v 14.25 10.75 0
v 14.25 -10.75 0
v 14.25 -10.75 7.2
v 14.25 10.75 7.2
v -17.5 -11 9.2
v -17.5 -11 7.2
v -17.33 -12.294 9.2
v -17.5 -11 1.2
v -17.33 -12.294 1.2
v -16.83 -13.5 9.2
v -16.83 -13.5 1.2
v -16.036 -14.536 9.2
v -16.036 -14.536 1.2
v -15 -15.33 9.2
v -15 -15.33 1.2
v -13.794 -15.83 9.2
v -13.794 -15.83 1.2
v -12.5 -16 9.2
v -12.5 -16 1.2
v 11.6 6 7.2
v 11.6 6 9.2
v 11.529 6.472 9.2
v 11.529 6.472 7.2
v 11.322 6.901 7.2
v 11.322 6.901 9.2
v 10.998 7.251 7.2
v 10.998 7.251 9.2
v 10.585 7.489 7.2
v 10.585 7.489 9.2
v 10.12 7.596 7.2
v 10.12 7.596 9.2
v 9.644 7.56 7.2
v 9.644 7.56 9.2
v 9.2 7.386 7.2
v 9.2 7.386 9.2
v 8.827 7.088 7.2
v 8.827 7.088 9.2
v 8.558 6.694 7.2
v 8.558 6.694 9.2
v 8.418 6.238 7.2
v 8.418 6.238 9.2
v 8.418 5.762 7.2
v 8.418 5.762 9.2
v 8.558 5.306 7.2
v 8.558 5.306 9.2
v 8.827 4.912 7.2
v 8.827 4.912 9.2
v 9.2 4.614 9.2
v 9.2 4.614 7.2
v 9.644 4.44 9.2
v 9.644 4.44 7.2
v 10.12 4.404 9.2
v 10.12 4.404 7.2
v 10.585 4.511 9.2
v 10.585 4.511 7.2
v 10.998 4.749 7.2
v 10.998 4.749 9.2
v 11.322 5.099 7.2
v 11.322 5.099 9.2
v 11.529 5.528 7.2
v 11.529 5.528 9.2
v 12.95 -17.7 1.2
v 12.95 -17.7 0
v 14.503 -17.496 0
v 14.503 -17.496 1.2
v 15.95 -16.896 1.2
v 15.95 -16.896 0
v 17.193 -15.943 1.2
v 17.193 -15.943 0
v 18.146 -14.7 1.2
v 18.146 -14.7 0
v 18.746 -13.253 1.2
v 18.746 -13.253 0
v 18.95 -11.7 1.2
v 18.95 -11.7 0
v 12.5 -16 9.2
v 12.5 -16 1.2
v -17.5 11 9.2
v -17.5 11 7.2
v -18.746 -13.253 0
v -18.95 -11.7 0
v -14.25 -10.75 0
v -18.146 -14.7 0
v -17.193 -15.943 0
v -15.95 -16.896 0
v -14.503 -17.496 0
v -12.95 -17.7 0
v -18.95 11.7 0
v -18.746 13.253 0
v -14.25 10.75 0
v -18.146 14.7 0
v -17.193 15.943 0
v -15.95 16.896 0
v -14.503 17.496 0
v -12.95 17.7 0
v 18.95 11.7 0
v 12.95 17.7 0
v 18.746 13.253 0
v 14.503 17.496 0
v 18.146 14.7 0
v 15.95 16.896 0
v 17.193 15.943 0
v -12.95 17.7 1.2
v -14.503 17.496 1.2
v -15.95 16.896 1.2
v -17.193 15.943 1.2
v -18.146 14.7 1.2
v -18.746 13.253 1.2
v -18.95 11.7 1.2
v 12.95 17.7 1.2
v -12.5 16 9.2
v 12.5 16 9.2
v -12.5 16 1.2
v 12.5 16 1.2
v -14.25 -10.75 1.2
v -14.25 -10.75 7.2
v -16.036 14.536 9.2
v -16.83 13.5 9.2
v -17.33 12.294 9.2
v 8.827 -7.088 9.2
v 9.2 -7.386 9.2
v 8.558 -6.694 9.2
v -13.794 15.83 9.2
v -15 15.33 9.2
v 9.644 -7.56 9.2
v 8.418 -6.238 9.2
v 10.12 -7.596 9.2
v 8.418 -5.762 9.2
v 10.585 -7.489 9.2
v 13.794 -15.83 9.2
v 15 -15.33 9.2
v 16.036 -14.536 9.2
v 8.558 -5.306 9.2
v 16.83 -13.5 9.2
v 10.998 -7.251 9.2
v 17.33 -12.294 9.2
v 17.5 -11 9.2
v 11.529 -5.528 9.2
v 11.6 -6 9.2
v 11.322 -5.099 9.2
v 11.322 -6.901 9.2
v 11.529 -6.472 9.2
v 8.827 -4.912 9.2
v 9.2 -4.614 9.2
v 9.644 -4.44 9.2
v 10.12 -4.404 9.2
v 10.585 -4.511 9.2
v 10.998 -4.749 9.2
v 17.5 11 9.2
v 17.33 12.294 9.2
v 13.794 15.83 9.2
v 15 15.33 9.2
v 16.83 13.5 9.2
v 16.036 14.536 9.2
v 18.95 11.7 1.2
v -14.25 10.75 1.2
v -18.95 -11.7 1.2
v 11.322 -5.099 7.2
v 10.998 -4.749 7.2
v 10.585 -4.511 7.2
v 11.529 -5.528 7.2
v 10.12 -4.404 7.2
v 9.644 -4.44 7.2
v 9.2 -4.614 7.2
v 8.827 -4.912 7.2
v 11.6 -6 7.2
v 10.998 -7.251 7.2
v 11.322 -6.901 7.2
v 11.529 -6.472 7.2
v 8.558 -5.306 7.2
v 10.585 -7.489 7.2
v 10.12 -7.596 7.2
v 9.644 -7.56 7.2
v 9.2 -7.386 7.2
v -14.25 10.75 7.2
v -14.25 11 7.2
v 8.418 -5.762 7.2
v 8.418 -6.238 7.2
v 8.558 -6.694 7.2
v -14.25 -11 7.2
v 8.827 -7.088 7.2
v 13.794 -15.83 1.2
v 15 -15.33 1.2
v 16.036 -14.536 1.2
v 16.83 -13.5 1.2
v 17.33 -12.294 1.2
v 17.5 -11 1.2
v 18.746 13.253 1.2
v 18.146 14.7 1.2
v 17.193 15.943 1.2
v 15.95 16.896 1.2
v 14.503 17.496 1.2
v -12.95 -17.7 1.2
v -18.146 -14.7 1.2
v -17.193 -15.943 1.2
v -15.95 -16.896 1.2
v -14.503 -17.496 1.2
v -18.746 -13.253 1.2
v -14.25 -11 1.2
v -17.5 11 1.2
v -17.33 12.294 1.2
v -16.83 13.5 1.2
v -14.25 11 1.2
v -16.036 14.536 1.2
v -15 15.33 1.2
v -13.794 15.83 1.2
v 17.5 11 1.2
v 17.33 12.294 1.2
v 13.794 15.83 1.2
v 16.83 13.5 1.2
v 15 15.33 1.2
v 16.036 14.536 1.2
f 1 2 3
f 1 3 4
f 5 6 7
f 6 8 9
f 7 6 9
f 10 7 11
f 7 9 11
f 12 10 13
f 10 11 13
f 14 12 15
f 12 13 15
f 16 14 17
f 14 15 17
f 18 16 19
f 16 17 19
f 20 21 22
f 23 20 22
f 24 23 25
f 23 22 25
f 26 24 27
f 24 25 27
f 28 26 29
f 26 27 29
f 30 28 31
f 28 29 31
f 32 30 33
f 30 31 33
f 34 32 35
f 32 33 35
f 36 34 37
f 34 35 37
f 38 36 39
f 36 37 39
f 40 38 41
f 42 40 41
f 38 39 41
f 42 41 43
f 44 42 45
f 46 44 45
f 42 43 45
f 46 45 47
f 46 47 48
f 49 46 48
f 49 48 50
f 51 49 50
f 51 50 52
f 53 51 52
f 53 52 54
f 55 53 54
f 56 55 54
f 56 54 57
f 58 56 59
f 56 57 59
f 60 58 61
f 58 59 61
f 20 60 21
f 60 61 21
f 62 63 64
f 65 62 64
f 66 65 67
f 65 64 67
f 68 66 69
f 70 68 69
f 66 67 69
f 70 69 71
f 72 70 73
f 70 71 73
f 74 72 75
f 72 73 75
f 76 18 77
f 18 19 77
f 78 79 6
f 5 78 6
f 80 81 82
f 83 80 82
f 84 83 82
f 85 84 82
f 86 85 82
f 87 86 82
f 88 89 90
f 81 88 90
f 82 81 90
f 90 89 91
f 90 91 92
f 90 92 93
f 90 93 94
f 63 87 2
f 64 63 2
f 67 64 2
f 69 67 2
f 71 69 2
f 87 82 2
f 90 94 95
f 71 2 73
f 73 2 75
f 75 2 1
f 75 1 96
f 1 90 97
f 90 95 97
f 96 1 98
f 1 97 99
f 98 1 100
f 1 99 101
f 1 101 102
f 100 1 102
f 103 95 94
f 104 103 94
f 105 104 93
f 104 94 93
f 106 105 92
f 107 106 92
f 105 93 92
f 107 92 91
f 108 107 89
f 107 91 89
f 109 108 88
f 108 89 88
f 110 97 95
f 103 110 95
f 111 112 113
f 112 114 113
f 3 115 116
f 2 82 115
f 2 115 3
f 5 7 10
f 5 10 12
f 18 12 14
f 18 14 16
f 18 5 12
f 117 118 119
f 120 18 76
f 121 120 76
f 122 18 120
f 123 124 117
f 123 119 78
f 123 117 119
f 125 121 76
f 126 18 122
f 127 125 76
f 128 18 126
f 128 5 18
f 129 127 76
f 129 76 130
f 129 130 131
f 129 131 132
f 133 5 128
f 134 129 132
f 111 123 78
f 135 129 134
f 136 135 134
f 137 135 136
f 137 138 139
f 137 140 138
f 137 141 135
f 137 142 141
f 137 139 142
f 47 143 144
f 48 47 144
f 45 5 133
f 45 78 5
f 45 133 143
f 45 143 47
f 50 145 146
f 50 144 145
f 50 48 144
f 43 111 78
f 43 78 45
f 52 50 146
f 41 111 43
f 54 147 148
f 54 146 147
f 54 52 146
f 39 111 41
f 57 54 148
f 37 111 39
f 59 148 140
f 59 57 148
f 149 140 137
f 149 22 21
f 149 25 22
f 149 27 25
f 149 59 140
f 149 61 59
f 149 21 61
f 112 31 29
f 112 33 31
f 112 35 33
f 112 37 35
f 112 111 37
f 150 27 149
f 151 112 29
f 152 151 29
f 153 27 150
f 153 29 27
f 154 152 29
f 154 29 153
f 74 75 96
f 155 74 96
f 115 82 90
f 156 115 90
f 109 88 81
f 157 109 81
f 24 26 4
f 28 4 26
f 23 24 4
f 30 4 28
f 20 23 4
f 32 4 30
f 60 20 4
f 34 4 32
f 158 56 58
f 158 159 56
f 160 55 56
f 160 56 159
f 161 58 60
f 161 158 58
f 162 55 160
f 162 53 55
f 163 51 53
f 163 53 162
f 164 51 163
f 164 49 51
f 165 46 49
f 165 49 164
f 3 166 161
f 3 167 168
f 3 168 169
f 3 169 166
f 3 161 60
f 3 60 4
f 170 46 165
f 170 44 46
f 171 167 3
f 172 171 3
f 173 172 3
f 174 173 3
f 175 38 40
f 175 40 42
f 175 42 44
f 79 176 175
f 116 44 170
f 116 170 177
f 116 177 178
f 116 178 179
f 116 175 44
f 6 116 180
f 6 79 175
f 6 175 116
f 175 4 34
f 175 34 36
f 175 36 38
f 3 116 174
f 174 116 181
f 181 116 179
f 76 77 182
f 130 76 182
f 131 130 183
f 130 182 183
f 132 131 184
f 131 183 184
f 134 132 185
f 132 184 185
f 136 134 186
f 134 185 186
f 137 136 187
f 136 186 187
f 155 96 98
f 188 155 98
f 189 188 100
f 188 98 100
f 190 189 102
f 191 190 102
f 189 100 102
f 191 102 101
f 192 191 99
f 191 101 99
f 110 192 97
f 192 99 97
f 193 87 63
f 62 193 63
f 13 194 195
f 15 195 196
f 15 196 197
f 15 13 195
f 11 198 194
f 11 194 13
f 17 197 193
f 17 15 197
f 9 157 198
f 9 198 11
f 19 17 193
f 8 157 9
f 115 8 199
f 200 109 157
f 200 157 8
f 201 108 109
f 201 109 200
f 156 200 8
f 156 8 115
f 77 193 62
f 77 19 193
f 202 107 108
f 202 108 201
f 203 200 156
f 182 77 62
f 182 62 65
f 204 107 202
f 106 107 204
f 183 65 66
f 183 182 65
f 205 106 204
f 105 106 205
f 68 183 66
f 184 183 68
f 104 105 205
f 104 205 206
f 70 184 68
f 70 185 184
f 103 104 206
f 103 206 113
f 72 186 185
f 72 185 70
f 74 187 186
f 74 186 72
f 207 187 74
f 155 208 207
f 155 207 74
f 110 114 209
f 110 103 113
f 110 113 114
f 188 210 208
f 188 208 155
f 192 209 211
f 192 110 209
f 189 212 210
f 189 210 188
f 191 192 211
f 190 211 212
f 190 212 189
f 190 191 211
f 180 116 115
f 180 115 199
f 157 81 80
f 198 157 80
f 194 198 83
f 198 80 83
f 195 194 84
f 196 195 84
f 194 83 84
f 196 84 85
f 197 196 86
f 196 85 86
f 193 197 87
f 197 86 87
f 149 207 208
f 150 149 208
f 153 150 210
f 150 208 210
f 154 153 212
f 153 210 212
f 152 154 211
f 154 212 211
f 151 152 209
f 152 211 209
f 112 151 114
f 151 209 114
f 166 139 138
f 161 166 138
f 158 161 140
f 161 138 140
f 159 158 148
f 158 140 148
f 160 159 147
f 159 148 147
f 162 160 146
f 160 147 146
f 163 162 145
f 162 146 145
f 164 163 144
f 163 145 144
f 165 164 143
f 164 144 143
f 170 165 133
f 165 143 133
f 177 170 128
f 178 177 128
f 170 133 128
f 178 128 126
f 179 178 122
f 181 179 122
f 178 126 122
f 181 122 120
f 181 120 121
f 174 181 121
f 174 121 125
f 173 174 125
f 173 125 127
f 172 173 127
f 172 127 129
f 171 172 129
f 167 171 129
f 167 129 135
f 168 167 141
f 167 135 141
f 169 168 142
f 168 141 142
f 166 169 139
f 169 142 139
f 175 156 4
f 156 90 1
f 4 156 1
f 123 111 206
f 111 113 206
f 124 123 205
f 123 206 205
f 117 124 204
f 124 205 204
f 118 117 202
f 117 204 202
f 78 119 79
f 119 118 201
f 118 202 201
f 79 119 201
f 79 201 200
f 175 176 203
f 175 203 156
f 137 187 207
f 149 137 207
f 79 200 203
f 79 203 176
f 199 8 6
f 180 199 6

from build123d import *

# Parameters (mm, degrees)
F0_W     = 28.5
F0_H     = 21.5
F1_DEPTH = 1.2
F2_W     = 28.5
F2_H     = 21.5
F3_DEPTH = 6
F5_DEPTH = 2
F6_W     = 22
F6_H     = 6
F7_DEPTH = 3.25
F8_R     = 1.6
F9_DEPTH = 2


with BuildPart() as f1:
    # F0 (on Top) → F1 (new body)
    with BuildSketch(Plane.XY):
        with BuildLine():
            ThreePointArc((18.95, 11.7), (17.192641, 15.942641), (12.95, 17.7))
            Line((12.95, 17.7), (-12.95, 17.7))
            ThreePointArc((-12.95, 17.7), (-17.192641, 15.942641), (-18.95, 11.7))
            Line((-18.95, 11.7), (-18.95, -11.7))
            ThreePointArc((-18.95, -11.7), (-17.192641, -15.942641), (-12.95, -17.7))
            Line((-12.95, -17.7), (12.95, -17.7))
            ThreePointArc((12.95, -17.7), (17.192641, -15.942641), (18.95, -11.7))
            Line((18.95, -11.7), (18.95, 11.7))
        make_face()
        Rectangle(F0_W, F0_H, mode=Mode.SUBTRACT)
    extrude(amount=F1_DEPTH)

    # F2 (on face) → F3 (join)
    with BuildSketch(Plane.XY.offset(1.2)):
        with BuildLine():
            ThreePointArc((17.5, 11), (16.035534, 14.535534), (12.5, 16))
            Line((12.5, 16), (-12.5, 16))
            ThreePointArc((-12.5, 16), (-16.035534, 14.535534), (-17.5, 11))
            Line((-17.5, 11), (-17.5, -11))
            ThreePointArc((-17.5, -11), (-16.035534, -14.535534), (-12.5, -16))
            Line((-12.5, -16), (12.5, -16))
            ThreePointArc((12.5, -16), (16.035534, -14.535534), (17.5, -11))
            Line((17.5, -11), (17.5, 11))
        make_face()
        Rectangle(F2_W, F2_H, mode=Mode.SUBTRACT)
    extrude(amount=F3_DEPTH)

    # F4 (on face) → F5 (join)
    with BuildSketch(Plane.XY.offset(7.2)):
        with BuildLine():
            ThreePointArc((17.5, 11), (16.035534, 14.535534), (12.5, 16))
            Line((12.5, 16), (-12.5, 16))
            ThreePointArc((-12.5, 16), (-16.035534, 14.535534), (-17.5, 11))
            Line((-17.5, 11), (-17.5, -11))
            ThreePointArc((-17.5, -11), (-16.035534, -14.535534), (-12.5, -16))
            Line((-12.5, -16), (12.5, -16))
            ThreePointArc((12.5, -16), (16.035534, -14.535534), (17.5, -11))
            Line((17.5, -11), (17.5, 11))
        make_face()
    extrude(amount=F5_DEPTH)

    # F6 (on face) → F7 (cut, through all)
    with BuildSketch(Plane(origin=(-17.5, 0, 0), x_dir=(0, -1, 0), z_dir=(-1, 0, 0))):
        with Locations((0, 4.2)):
            Rectangle(F6_W, F6_H)
    extrude(amount=-F7_DEPTH, mode=Mode.SUBTRACT)

    # F8 (on face) → F9 (cut, through all)
    with BuildSketch(Plane.XY.offset(9.2)):
        with Locations((10, 6)):
            Circle(F8_R)
        with Locations((10, -6)):
            Circle(F8_R)
    extrude(amount=-F9_DEPTH, mode=Mode.SUBTRACT)


solid = f1.part
